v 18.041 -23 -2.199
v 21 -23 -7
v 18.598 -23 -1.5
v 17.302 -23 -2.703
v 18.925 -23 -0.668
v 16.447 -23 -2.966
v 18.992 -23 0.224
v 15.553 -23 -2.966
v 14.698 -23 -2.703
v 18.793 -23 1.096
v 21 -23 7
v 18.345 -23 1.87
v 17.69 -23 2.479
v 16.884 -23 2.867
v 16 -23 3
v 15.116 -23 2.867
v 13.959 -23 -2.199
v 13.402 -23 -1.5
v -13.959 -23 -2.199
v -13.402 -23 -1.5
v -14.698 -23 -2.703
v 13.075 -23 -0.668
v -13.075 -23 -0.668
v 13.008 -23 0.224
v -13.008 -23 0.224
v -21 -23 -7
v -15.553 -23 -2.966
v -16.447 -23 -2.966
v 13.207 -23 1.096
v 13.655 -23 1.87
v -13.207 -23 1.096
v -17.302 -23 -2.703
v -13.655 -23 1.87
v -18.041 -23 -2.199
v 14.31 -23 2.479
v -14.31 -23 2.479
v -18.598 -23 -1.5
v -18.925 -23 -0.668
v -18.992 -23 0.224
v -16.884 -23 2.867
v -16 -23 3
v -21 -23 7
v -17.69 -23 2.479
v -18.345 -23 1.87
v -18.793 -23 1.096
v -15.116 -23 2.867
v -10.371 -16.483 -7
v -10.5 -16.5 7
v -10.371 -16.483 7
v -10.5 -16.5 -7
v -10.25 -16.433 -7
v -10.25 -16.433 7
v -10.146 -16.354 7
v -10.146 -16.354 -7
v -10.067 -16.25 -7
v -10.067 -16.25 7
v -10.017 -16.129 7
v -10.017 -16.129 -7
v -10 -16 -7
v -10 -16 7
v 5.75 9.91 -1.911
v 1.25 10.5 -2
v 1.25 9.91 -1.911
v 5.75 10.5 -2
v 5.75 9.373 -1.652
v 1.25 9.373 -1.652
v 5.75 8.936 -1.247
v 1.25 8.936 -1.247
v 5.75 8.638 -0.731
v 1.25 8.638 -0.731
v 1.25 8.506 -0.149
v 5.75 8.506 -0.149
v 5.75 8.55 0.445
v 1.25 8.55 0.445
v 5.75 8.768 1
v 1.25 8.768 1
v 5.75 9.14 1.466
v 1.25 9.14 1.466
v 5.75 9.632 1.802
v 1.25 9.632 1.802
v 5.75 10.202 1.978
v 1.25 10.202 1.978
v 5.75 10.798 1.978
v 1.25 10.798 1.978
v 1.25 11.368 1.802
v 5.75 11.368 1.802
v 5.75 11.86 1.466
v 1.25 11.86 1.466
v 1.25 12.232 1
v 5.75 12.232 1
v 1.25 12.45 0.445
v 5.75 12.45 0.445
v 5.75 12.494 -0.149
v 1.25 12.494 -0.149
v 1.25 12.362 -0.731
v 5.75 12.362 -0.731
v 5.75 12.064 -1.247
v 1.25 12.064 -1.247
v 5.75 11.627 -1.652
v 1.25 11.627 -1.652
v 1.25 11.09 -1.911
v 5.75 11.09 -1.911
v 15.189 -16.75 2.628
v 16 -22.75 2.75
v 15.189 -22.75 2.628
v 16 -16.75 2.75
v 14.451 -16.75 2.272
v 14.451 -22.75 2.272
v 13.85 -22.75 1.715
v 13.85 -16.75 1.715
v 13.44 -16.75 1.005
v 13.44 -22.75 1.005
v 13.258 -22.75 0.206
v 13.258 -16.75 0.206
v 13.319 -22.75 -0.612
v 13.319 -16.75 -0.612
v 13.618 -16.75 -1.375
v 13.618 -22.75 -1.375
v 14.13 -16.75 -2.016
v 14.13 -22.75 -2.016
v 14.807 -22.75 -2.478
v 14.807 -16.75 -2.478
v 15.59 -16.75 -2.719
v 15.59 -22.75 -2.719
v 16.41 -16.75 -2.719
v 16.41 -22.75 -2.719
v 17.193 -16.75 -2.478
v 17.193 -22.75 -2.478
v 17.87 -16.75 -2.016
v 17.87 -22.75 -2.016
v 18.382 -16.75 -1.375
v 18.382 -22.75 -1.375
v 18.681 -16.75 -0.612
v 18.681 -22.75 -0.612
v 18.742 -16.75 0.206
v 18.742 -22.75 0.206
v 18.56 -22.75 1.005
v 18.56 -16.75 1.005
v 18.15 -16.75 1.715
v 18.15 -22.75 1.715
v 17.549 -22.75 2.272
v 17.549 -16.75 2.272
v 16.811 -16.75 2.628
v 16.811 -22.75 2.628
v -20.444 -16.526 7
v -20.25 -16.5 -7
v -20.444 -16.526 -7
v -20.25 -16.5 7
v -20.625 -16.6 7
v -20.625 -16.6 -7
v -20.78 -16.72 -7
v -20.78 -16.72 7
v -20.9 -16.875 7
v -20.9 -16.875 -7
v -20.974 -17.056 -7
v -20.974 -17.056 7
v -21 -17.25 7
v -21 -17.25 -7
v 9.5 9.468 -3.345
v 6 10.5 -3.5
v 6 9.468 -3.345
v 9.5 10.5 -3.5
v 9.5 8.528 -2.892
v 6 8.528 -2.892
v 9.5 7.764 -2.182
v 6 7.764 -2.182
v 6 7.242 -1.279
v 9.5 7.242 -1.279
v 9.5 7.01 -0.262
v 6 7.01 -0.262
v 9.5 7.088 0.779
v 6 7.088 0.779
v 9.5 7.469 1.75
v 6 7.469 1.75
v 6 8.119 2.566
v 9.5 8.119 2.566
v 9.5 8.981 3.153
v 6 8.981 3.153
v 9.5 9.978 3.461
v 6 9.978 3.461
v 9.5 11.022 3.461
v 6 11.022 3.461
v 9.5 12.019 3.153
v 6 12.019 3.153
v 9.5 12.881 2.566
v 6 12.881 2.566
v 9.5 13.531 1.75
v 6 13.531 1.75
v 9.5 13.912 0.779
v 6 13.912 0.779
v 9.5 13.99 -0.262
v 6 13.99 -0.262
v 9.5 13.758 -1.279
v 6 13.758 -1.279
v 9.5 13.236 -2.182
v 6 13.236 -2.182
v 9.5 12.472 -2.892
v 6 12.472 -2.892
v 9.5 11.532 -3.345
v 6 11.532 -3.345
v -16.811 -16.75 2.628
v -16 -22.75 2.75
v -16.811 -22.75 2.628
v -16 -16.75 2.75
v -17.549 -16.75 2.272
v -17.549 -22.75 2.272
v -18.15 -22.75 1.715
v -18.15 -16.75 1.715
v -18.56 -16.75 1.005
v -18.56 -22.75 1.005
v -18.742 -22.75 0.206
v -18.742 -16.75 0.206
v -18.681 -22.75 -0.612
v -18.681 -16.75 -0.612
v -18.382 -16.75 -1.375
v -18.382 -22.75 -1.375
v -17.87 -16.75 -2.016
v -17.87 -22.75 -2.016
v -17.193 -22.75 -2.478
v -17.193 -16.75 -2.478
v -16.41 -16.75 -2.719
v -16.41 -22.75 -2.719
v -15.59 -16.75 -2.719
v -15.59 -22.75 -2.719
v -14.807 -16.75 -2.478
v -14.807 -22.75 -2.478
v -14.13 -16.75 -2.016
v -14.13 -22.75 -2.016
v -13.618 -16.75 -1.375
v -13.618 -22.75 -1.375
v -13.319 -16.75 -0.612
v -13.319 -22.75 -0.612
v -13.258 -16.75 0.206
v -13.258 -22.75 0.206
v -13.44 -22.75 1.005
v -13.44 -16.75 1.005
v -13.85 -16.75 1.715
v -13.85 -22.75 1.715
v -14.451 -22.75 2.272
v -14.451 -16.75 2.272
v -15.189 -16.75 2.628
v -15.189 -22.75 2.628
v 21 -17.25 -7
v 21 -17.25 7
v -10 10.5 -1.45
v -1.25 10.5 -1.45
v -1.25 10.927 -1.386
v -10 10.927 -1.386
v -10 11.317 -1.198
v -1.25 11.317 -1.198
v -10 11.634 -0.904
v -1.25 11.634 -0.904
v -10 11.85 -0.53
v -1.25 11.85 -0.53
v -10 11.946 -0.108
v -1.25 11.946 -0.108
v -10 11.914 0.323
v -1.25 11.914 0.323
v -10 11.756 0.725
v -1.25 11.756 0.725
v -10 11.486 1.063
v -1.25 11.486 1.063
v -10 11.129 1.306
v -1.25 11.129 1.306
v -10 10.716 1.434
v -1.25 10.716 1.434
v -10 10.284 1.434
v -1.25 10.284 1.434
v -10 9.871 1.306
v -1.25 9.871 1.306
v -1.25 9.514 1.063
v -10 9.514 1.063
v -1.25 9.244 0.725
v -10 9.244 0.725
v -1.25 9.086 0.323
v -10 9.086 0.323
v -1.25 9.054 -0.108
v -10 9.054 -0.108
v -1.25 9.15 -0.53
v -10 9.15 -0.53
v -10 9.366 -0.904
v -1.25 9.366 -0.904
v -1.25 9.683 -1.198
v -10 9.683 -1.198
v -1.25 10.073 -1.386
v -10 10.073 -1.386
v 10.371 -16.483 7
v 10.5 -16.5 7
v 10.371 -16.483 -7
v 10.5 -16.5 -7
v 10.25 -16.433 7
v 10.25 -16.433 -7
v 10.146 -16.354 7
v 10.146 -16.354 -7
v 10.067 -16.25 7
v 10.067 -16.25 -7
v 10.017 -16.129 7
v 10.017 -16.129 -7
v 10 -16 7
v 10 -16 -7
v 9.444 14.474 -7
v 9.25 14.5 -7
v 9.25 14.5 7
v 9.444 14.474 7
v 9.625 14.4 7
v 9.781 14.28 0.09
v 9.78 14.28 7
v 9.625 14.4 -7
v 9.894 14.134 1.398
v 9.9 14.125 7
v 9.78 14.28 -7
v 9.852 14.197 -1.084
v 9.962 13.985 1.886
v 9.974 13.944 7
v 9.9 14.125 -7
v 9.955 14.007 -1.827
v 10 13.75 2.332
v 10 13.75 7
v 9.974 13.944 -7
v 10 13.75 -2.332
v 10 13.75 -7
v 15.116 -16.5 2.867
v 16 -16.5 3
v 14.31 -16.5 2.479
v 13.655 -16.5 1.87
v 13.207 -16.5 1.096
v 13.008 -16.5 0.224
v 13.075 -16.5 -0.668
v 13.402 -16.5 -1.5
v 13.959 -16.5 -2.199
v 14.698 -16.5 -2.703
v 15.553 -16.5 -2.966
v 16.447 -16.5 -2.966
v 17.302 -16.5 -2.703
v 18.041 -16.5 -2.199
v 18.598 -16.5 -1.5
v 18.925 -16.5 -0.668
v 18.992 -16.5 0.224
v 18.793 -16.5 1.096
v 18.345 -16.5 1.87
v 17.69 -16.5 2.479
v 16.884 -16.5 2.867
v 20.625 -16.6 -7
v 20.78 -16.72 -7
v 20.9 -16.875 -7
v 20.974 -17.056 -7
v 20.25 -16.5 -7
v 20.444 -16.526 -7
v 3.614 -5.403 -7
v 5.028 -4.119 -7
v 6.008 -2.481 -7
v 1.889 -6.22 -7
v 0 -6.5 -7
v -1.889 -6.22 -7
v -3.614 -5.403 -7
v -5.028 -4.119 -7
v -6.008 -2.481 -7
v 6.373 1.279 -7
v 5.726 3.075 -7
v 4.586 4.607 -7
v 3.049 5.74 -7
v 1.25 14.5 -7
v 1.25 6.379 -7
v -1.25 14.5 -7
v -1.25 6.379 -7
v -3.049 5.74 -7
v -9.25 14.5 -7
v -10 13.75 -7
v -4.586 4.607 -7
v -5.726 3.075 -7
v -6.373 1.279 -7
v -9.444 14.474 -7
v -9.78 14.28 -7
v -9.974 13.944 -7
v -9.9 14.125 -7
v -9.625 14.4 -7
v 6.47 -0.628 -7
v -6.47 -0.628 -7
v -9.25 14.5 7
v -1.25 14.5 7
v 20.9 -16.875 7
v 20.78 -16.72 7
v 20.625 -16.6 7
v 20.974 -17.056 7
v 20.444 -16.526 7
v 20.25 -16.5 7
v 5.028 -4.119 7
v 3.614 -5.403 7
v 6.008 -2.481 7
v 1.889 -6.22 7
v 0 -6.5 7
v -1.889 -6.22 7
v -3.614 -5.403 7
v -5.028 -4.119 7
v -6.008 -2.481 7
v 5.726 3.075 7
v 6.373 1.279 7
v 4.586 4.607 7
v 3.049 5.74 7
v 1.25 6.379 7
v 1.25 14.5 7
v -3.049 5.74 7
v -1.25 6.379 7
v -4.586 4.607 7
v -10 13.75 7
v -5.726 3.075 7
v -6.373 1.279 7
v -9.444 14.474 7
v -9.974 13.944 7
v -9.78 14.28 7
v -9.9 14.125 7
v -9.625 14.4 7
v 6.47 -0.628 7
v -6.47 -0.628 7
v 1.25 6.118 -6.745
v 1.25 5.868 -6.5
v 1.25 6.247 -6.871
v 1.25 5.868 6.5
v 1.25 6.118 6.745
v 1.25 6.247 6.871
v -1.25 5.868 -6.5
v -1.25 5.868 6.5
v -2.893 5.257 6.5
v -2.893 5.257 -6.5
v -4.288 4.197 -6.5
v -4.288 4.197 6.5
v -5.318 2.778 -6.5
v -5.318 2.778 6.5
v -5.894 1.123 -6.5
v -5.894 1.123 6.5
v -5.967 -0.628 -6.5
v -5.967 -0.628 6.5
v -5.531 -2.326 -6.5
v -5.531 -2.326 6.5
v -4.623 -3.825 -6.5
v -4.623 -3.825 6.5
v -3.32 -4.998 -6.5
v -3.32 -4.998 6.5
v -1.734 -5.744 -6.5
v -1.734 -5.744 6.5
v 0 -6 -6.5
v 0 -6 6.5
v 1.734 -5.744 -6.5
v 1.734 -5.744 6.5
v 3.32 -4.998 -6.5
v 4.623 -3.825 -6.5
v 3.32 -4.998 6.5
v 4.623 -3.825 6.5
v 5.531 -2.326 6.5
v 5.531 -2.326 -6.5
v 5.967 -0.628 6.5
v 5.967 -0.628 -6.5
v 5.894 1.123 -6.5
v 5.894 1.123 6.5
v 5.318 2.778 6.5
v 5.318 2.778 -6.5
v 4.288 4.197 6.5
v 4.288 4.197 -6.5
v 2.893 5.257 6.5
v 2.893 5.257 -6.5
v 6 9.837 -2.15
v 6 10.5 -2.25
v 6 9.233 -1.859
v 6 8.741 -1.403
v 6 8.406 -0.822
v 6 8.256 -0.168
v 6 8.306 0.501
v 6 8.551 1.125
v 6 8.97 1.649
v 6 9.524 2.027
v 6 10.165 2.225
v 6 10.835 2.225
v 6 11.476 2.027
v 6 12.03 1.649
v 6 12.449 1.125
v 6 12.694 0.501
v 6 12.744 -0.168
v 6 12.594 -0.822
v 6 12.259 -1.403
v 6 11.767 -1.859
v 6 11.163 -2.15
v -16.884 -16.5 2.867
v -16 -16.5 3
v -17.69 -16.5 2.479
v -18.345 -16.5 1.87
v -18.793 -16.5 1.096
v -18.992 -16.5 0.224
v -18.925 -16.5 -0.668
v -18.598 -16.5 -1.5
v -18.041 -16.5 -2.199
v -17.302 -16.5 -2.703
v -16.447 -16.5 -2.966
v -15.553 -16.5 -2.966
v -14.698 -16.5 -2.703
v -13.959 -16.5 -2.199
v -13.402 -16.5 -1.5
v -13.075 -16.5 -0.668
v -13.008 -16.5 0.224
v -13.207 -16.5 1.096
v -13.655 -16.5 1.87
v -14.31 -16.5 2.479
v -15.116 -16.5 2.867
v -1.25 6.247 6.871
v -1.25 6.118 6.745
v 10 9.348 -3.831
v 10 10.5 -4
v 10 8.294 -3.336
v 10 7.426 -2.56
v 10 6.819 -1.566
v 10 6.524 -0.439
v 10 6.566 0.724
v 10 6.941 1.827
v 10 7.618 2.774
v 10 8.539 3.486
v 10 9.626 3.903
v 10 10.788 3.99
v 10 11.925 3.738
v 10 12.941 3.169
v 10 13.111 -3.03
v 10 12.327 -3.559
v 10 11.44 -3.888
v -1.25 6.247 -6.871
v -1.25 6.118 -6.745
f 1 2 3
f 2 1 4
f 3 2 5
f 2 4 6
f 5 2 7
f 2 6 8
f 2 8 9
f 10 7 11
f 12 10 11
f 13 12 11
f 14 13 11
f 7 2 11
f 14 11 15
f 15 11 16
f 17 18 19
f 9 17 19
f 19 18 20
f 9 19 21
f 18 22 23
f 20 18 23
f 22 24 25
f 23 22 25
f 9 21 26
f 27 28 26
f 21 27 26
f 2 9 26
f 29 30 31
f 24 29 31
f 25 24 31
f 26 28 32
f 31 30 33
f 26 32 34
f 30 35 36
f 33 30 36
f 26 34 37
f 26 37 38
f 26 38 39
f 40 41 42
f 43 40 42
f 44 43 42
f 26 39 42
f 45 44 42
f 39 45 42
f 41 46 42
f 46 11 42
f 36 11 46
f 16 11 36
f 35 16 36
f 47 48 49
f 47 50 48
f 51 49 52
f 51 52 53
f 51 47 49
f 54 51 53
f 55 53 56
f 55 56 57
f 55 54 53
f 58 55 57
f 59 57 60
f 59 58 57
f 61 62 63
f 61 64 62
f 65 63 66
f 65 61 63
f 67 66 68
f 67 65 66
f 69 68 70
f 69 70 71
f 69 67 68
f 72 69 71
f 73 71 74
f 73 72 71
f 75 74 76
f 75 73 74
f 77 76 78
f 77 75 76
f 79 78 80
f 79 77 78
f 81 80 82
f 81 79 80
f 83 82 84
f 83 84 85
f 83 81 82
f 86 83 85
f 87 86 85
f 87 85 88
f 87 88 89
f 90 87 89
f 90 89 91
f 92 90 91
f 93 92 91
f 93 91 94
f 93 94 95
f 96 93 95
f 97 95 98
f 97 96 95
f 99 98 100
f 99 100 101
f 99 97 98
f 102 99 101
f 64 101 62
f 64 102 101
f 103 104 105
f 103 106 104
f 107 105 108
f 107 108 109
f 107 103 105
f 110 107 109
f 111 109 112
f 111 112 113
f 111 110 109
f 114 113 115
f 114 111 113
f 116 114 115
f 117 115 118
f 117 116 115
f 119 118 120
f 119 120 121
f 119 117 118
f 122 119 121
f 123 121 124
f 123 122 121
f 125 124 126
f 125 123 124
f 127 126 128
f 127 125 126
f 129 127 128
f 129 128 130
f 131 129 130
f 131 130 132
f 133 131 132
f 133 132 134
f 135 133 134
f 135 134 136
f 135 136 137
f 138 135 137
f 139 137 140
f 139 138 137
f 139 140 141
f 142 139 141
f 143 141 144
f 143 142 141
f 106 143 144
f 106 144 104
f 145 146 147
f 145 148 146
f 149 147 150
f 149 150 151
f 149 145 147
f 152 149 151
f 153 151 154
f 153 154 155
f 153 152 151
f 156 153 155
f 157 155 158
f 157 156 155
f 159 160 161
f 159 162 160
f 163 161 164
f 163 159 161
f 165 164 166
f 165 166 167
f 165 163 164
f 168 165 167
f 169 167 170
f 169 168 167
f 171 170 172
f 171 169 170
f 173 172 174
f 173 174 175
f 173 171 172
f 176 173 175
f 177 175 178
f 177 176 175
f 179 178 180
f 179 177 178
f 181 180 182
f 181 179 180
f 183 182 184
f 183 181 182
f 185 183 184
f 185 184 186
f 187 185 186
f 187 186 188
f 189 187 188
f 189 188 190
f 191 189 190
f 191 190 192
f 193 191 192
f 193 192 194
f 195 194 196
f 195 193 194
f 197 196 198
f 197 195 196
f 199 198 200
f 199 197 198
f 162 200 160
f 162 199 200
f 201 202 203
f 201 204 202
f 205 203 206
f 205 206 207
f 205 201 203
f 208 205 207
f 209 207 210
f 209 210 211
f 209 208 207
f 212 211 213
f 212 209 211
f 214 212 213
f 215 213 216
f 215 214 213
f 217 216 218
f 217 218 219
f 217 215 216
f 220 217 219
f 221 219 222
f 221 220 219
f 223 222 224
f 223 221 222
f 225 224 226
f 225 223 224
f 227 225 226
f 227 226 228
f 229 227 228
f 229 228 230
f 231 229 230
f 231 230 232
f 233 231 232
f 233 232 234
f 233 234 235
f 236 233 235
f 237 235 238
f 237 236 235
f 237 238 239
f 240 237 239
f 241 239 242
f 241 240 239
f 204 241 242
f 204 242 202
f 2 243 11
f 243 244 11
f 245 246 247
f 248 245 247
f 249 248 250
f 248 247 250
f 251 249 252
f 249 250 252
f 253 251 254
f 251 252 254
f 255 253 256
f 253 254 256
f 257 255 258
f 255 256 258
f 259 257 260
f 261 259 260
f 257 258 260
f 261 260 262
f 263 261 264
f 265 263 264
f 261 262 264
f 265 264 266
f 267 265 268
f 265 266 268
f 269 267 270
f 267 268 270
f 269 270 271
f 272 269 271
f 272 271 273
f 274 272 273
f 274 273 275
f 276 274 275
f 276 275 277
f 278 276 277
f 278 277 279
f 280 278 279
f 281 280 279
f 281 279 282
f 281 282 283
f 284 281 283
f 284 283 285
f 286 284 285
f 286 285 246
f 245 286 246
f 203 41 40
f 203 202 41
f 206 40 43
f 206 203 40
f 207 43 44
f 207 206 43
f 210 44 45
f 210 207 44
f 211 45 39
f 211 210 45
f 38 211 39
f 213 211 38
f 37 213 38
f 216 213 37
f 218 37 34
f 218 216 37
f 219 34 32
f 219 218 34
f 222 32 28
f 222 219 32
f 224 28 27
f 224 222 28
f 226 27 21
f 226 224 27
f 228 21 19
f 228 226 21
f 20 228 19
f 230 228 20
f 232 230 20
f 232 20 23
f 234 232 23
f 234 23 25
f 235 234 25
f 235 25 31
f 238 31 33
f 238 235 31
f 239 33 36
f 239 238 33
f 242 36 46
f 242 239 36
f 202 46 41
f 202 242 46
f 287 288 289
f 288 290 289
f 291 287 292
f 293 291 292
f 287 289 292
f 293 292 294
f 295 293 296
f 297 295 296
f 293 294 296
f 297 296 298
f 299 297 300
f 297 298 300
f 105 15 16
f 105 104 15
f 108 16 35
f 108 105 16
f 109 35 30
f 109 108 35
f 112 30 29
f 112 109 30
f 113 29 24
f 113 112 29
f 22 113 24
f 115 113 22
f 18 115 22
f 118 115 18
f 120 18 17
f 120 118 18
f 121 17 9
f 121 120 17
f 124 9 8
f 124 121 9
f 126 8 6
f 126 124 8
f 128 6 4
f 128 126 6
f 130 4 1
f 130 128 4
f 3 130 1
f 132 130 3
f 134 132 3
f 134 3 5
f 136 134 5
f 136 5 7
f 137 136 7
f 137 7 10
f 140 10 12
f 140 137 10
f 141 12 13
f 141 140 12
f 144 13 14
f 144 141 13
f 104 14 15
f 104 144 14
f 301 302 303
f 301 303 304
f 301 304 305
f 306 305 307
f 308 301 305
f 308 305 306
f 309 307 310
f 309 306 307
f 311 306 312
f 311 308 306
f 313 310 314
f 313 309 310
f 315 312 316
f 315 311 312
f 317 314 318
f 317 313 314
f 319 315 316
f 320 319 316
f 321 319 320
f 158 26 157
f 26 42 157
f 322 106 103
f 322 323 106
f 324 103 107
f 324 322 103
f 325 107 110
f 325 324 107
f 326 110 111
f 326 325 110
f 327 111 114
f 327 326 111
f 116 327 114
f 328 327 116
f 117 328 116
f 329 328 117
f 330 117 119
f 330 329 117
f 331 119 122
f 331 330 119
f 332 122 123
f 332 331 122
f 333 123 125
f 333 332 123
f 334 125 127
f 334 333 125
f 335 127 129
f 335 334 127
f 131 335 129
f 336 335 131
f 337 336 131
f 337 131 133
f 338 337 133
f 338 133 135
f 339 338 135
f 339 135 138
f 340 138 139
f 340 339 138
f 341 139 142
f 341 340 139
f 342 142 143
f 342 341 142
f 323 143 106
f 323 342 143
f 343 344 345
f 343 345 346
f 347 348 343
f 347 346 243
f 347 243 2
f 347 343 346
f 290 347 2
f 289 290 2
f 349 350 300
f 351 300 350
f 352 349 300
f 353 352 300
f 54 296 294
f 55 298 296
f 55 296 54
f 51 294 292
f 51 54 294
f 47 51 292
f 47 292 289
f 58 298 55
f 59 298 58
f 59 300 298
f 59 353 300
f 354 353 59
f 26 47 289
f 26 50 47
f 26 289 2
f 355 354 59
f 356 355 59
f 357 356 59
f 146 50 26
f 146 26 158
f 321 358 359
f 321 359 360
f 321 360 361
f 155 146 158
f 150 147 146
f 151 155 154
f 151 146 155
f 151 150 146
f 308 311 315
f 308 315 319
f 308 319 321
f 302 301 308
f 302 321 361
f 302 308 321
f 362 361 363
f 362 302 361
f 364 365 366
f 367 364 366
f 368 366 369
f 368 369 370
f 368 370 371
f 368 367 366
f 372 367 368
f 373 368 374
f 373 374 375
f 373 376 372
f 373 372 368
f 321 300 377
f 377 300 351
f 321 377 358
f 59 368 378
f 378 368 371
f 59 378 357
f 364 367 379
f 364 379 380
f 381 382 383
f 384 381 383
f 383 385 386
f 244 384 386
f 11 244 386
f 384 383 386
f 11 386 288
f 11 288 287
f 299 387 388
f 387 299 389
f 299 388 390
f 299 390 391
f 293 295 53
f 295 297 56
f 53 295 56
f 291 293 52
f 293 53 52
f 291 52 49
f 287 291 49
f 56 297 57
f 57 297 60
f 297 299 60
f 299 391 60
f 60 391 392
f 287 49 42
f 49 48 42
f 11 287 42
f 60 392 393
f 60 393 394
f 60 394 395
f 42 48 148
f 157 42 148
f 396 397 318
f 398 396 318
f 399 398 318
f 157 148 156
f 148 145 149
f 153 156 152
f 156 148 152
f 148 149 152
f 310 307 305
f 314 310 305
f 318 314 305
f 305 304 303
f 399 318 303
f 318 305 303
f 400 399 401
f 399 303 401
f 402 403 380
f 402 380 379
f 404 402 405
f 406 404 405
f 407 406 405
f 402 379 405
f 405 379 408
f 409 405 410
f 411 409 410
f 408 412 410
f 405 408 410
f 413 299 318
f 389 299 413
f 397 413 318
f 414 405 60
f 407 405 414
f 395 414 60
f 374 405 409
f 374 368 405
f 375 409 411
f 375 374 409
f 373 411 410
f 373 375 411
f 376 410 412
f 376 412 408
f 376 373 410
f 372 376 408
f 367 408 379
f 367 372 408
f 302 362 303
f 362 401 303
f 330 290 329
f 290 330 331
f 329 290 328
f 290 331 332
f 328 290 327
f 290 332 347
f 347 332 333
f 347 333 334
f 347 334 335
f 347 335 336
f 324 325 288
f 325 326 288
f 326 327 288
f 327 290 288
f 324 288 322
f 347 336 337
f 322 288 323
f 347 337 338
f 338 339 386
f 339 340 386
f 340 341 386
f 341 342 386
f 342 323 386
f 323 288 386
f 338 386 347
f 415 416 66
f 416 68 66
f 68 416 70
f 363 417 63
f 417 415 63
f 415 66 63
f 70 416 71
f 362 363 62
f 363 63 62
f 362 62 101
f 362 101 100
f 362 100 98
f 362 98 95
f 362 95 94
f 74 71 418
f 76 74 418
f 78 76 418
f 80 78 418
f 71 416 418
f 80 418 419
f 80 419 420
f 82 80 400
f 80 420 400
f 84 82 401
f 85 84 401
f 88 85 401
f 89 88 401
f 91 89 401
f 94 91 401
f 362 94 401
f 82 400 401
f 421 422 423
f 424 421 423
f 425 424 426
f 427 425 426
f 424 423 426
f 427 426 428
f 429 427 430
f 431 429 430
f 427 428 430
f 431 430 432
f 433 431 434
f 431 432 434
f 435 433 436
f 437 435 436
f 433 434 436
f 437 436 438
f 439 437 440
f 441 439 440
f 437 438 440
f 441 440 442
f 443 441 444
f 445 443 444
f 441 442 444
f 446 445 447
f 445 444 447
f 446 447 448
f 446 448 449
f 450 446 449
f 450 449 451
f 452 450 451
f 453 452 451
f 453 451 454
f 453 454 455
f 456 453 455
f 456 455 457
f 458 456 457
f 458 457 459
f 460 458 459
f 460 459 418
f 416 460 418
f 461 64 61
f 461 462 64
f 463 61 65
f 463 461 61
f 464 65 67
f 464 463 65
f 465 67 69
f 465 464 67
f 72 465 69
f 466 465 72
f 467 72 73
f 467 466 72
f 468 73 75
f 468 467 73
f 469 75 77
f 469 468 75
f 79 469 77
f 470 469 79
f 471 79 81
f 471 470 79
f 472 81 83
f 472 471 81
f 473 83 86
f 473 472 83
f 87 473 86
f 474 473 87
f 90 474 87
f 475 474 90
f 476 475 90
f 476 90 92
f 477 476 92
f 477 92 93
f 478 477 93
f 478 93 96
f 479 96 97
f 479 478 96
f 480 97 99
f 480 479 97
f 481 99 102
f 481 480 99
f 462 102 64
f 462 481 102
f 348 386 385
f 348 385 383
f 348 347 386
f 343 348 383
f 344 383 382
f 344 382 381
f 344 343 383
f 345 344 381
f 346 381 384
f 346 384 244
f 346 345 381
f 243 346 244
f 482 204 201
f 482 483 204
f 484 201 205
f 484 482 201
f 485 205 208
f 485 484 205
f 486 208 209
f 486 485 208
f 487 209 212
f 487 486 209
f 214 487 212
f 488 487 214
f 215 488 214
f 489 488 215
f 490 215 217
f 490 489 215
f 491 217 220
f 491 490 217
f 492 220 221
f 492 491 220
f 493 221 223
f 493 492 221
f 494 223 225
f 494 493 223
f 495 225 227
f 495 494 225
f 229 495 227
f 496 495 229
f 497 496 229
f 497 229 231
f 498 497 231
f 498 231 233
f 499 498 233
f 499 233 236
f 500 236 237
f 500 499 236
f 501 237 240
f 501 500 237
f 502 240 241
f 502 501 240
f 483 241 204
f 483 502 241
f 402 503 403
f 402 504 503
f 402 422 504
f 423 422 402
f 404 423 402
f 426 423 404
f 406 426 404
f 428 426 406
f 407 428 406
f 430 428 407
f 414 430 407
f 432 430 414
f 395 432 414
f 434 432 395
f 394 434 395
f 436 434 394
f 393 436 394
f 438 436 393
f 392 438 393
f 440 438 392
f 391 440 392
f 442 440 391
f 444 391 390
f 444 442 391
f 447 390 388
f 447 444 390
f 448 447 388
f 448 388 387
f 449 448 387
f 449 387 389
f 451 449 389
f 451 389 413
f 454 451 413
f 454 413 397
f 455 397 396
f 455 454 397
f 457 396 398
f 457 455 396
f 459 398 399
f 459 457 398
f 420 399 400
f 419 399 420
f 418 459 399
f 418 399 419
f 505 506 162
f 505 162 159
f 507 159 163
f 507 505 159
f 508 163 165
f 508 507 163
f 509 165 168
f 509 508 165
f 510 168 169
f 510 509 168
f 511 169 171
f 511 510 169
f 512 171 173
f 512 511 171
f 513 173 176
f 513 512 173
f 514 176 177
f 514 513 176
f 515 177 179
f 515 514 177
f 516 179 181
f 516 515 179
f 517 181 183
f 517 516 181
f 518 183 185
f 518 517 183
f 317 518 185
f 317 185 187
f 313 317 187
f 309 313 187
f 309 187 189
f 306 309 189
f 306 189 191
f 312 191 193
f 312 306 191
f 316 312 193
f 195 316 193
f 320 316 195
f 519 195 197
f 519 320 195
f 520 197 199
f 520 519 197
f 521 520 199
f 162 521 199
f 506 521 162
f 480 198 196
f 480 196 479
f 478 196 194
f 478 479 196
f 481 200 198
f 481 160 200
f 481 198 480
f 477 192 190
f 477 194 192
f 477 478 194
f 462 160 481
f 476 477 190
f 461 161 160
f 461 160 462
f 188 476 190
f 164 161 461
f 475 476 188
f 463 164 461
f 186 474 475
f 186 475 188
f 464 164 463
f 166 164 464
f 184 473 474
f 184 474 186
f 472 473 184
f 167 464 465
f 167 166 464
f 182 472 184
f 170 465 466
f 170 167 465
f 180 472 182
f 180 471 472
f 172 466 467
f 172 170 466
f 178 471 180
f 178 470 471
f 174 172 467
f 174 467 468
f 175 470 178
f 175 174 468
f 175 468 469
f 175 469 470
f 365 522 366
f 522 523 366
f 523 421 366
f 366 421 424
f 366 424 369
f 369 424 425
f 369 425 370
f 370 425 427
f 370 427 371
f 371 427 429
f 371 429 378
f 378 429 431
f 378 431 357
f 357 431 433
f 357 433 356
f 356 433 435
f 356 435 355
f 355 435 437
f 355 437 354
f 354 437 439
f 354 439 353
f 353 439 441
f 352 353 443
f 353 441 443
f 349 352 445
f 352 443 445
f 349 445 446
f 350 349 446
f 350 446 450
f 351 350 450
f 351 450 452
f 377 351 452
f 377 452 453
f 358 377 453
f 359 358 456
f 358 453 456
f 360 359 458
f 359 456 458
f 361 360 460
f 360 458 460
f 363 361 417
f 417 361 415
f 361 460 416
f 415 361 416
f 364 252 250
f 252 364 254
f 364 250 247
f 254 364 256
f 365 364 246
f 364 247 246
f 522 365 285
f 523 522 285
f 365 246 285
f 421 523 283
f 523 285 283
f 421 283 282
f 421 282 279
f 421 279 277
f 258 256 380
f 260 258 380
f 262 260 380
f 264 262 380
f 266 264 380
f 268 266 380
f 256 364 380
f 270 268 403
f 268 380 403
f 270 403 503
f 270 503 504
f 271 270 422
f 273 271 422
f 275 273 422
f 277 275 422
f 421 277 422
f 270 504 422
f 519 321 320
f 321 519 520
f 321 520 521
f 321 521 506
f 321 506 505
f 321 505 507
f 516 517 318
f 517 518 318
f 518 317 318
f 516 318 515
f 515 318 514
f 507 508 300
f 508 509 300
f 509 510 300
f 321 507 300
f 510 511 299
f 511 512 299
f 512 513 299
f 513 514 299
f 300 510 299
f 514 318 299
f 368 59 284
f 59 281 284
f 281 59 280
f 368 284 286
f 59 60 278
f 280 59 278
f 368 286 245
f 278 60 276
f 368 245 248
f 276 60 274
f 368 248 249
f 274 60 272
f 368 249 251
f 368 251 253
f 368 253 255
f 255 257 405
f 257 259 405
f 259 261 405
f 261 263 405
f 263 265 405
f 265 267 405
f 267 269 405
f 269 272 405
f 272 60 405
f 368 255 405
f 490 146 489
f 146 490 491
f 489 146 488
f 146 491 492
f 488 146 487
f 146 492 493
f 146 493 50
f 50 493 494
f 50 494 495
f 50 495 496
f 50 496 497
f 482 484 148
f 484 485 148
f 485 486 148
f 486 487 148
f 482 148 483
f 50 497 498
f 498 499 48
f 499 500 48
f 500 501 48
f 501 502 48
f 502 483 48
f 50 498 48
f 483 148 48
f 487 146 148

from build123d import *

# Parameters (mm, degrees)
BOSS_EXTRUDE1_DEPTH                 = 7
F_5_5_5_5_DIAMETER_HOLE2_AT_2_COUNT = 2
F_5_5_5_5_DIAMETER_HOLE2_AT_2_PITCH = 32
M3_5X0_6_TAPPED_HOLE1_D             = 2.9
M3_5X0_6_TAPPED_HOLE1_DEPTH         = 8.75
FILLET1_R                           = 0.75
FILLET1_2_R                         = 0.5
CHAMFER1_SIZE                       = 0.5


with BuildPart() as part:
    # Sketch2 → Boss-Extrude1 (new body, symmetric)
    with BuildSketch(Plane.XY):
        with BuildLine():
            Line((-21, -16.5), (-10, -16.5))
            Line((-10, -16.5), (-10, 14.5))
            Line((-10, 14.5), (-1.25, 14.5))
            Line((-1.25, 14.5), (-1.25, 5.868347297))
            ThreePointArc((-1.25, 5.868347297), (0, -6), (1.25, 5.868347297))
            Line((1.25, 5.868347297), (1.25, 14.5))
            Line((1.25, 14.5), (10, 14.5))
            Line((10, 14.5), (10, -16.5))
            Line((10, -16.5), (21, -16.5))
            Line((21, -16.5), (21, -23))
            Line((21, -23), (-21, -23))
            Line((-21, -23), (-21, -16.5))
        make_face()
    extrude(amount=BOSS_EXTRUDE1_DEPTH, both=True)

    # Sketch5 → 5.5 _5.5_ Diameter Hole2 (revolve, cut)
    with BuildSketch(Plane(origin=(-16, -16.5, 0), x_dir=(0, 0, 1), z_dir=(1, 0, 0))):
        Polygon((0, 0), (0, 6.5), (3, 6.5), (2.75, 6.25), (2.75, 0.25), (3, 0), align=None)
    f_5_5_5_5_diameter_hole2 = revolve(axis=Axis((-16, -10.15, 0), (0, -1, 0)), mode=Mode.SUBTRACT)

    # 5.5 _5.5_ Diameter Hole2 at 2: 5.5 _5.5_ Diameter Hole2 ×2
    with Locations(*[(i * F_5_5_5_5_DIAMETER_HOLE2_AT_2_PITCH, 0, 0) for i in range(1, F_5_5_5_5_DIAMETER_HOLE2_AT_2_COUNT)]):
        add(f_5_5_5_5_diameter_hole2, mode=Mode.SUBTRACT)

    # M3.5x0.6 Tapped Hole1
    with Locations(Plane.ZY.offset(10)):
        with Locations((0, 10.5)):
            Hole(M3_5X0_6_TAPPED_HOLE1_D / 2, depth=M3_5X0_6_TAPPED_HOLE1_DEPTH)

    # Fillet1
    fillet1_edges = [part.edges().sort_by_distance(p)[0] for p in [
        (10, 14.5, 0),
        (-10, 14.5, 0),
        (21, -16.5, 0),
        (-21, -16.5, 0),
    ]]
    fillet(fillet1_edges, radius=FILLET1_R)

    # Fillet1 2
    fillet1_2_edges = [part.edges().sort_by_distance(p)[0] for p in [
        (10, -16.5, 0),
        (-10, -16.5, 0),
    ]]
    fillet(fillet1_2_edges, radius=FILLET1_2_R)

    # Sketch12 → CBORE for M5 Hex Head Bolt1 (revolve, cut)
    with BuildSketch(Plane(origin=(10, 10.5, 0), x_dir=(0, 0, -1), z_dir=(0, 1, 0))):
        Polygon((0, 0), (0, 8.75), (2, 8.75), (2, 4.25), (2.25, 4), (3.5, 4), (3.5, 0.5), (4, 0), align=None)
    revolve(axis=Axis((16.35, 10.5, 0), (-1, 0, 0)), mode=Mode.SUBTRACT)

    # Chamfer1
    chamfer1_edges = [part.edges().sort_by_distance(p)[0] for p in [
        (0, -6, 7),
        (0, -6, -7),
    ]]
    chamfer(chamfer1_edges, length=CHAMFER1_SIZE)


solid = part.part
